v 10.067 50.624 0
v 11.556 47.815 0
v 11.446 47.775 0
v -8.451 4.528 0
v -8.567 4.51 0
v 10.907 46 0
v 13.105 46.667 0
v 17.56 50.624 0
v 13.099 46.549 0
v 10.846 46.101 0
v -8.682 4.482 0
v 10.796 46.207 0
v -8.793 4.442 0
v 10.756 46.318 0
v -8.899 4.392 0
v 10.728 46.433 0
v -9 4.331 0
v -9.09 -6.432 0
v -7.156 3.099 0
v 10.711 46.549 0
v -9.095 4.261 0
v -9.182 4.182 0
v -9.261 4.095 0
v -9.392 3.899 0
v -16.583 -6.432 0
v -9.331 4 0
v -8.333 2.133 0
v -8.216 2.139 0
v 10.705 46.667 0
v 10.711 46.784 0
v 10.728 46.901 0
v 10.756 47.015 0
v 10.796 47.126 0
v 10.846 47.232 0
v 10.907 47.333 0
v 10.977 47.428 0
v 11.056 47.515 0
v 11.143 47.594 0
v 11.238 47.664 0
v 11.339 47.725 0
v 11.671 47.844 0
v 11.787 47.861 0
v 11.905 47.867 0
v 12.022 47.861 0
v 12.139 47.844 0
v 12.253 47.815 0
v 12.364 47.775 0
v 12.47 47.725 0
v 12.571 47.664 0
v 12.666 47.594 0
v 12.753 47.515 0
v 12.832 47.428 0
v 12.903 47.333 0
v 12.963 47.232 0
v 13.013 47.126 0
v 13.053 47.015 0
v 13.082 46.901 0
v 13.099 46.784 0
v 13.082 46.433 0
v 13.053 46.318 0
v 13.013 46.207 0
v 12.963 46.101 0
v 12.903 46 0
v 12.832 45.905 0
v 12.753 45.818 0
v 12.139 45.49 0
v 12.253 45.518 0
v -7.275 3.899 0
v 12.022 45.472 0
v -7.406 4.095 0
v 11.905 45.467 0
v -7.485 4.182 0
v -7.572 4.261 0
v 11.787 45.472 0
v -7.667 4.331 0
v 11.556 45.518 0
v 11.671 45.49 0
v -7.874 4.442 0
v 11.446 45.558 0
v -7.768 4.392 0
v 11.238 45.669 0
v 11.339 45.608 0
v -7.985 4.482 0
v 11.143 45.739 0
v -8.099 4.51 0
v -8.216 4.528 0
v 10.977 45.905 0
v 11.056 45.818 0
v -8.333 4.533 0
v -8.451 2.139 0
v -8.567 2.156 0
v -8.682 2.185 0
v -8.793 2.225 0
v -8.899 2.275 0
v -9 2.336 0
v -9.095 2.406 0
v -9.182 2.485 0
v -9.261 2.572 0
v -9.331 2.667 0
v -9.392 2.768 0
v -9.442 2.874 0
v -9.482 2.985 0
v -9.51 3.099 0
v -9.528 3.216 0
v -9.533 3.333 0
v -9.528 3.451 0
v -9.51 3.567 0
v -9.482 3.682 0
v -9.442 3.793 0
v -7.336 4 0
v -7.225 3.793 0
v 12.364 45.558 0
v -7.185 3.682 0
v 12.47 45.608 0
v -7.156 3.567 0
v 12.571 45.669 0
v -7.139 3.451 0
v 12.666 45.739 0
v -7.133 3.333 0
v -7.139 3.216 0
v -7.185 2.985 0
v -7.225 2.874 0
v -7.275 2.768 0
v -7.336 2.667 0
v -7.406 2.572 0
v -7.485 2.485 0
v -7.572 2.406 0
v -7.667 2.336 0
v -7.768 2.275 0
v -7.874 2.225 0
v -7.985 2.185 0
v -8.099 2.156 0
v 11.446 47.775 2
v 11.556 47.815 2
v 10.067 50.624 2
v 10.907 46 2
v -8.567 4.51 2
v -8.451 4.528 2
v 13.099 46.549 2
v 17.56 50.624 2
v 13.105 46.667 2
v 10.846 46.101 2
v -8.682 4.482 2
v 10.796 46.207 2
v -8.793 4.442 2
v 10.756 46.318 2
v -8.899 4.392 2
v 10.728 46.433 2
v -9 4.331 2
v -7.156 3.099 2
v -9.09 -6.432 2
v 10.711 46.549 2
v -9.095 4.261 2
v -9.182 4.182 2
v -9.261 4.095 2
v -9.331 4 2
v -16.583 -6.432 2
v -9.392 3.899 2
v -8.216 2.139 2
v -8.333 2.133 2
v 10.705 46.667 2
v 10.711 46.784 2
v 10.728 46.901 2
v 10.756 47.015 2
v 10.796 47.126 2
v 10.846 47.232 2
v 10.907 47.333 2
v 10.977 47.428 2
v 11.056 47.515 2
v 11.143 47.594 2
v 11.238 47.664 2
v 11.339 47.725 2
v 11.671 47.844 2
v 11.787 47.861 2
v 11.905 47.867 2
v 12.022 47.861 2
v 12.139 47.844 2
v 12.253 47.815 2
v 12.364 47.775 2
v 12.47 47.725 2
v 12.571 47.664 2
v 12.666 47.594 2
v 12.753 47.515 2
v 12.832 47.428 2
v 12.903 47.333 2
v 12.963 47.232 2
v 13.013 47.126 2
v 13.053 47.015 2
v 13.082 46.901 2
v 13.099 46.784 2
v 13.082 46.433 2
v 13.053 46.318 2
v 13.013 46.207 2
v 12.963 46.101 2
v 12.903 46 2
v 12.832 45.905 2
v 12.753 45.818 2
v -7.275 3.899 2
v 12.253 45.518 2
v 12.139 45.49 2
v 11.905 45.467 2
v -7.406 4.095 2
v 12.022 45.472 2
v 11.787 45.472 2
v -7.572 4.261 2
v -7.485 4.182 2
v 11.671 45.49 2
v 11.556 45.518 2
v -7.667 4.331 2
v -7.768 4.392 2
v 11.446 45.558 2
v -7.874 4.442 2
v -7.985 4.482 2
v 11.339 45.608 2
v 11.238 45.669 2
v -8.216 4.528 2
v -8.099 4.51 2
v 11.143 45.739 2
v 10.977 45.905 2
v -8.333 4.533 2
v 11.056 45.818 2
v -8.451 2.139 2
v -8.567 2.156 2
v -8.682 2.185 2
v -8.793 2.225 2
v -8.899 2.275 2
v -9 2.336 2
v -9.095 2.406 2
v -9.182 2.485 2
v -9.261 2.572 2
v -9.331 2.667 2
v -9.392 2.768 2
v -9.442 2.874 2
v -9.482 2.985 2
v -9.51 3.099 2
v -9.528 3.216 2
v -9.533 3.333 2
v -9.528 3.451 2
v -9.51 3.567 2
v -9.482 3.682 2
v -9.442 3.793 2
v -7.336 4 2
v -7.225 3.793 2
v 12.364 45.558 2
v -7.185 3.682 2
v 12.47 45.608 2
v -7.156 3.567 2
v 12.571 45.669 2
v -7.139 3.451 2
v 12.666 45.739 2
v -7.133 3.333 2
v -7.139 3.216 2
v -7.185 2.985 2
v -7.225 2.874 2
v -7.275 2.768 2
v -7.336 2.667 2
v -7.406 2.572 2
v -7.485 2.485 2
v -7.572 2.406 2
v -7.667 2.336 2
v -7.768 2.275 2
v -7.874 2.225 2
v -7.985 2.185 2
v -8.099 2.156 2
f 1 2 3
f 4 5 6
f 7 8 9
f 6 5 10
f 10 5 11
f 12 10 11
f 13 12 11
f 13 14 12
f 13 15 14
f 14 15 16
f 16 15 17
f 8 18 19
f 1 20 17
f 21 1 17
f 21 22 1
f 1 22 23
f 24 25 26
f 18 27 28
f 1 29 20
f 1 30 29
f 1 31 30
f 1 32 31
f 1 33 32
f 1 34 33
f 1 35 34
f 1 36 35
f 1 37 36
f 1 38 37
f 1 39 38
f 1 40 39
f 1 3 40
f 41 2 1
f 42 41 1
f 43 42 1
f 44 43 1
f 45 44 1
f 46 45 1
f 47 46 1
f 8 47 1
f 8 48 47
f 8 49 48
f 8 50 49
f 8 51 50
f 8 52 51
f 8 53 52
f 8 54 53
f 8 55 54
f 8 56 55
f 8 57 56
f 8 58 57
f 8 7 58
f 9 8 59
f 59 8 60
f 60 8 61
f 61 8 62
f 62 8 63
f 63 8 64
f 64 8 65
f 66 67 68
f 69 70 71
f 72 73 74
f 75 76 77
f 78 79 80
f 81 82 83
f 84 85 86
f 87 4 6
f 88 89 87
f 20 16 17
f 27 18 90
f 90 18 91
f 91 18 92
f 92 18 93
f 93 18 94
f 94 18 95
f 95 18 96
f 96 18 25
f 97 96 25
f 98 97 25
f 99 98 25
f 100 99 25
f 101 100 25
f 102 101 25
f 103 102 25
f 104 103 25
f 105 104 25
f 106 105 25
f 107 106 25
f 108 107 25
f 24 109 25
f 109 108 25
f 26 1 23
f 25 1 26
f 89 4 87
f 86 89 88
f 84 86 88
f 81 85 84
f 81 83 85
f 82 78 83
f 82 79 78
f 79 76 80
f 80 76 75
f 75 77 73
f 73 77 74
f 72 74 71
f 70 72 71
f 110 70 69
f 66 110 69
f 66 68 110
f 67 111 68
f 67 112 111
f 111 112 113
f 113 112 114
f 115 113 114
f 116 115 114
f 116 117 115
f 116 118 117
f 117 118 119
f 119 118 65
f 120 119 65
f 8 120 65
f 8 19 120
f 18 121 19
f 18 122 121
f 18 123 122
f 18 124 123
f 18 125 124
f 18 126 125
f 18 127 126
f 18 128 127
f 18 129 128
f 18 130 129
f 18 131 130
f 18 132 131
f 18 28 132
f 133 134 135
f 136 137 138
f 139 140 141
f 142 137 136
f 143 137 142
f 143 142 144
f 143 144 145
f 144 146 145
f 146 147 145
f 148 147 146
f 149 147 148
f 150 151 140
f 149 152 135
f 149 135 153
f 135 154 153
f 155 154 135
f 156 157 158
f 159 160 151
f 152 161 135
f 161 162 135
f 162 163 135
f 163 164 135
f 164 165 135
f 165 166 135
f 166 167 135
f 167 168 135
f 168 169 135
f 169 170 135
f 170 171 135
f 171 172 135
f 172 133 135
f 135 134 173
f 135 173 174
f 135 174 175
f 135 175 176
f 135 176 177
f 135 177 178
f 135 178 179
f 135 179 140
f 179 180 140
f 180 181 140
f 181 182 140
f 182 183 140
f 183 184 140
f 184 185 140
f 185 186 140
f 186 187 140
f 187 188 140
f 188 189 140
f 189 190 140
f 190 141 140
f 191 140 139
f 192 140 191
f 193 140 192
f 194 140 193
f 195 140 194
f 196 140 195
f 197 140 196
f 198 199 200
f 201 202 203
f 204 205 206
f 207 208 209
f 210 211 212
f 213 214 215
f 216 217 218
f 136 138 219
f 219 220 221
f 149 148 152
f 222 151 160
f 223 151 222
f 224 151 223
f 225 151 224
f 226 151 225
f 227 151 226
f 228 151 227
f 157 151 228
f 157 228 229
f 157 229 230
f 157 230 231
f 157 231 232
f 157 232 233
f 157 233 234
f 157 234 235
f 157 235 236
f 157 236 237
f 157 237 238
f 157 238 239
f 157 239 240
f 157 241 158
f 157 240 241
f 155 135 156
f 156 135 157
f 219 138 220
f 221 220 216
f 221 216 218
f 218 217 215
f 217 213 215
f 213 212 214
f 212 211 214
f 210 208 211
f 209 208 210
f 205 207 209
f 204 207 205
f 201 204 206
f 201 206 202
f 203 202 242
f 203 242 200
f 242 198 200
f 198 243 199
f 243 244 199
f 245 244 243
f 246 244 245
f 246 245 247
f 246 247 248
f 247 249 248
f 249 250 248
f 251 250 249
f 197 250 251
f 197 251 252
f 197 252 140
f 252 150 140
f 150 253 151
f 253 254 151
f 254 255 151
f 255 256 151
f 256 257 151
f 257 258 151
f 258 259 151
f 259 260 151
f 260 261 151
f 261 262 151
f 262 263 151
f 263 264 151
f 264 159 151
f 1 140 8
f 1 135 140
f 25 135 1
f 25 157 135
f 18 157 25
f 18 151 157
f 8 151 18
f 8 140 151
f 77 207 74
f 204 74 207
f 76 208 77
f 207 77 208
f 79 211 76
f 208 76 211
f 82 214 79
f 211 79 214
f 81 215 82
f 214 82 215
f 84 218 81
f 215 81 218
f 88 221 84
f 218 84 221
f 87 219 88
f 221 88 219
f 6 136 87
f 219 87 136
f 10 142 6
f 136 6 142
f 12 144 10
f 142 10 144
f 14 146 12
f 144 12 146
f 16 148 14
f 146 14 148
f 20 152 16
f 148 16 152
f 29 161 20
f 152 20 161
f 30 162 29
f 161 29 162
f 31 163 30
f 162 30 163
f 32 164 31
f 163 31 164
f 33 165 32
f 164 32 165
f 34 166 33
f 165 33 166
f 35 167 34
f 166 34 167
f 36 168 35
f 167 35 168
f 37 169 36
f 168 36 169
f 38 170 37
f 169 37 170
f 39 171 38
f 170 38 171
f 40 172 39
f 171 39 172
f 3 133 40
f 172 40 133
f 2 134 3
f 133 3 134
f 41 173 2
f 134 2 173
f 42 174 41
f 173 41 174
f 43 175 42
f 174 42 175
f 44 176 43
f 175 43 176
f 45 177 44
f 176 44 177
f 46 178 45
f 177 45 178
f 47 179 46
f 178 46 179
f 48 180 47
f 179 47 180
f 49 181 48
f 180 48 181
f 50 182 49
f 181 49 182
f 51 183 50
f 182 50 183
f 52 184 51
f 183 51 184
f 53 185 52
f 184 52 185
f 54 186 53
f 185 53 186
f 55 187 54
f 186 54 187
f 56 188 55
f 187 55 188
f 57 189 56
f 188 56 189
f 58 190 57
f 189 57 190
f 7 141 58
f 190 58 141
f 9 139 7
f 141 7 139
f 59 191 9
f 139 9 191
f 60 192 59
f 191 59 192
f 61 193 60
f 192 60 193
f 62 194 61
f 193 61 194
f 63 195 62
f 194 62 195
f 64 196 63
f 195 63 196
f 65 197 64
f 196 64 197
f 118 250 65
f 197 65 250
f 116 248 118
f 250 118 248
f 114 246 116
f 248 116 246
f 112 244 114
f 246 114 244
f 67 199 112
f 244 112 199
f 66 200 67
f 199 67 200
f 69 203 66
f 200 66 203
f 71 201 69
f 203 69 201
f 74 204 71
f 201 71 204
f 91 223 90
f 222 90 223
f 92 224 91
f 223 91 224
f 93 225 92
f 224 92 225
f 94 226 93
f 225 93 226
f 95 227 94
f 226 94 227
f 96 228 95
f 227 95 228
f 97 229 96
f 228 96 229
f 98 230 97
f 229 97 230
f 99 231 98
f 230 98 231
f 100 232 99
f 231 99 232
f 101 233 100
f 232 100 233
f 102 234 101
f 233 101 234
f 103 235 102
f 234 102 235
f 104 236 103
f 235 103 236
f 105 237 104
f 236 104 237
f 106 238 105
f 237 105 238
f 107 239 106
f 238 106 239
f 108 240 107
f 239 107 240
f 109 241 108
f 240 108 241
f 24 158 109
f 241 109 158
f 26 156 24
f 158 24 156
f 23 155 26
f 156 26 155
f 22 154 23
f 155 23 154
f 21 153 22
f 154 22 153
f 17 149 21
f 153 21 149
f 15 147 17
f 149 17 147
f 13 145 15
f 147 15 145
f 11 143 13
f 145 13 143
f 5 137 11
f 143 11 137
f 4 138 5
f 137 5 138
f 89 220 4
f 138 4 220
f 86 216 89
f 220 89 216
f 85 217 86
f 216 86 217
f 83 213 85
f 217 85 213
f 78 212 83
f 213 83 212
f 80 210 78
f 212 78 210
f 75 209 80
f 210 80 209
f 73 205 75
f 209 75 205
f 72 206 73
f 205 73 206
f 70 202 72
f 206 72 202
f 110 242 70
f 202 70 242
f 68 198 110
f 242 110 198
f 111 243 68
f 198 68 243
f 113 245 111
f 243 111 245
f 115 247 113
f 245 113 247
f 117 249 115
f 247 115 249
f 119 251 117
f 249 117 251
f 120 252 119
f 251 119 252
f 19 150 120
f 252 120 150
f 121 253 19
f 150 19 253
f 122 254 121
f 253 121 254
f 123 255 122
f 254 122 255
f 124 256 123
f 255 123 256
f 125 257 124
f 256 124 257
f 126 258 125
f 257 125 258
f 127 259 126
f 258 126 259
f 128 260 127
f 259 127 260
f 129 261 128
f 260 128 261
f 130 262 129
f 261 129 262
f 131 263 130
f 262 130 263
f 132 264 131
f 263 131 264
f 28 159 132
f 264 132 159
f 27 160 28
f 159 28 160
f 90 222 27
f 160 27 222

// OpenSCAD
$fn = $preview ? 12 : 64;

// letterbox thickness is ~17.5mm
// screw recommends drill hole of 2mm diameter
// measured max screw diameter is 2.85mm

module main () {
  letter3d(
    char = "/",
    char_size = 50,
    height = 2,
    with_holes = true,
    hole_radius = 1.2
  );
}

module letter3d (char, char_size, height = 2, with_holes, hole_radius) {
  linear_extrude(height = height)
    letter2d(
      char = char,
      char_size = char_size,
      with_holes = with_holes,
      hole_radius = hole_radius
    );
}

module letter2d (char, char_size, with_holes = false, hole_radius) {
  difference() {
    letter2d_text(char = char, char_size = char_size);

    if (with_holes) {
      letter2d_holes(char = char, char_size = char_size, hole_radius = hole_radius);
    }
  }
}

module letter2d_text(char, char_size = 10) {
  text(
    text = char,
    size = char_size,
    // font = "DejaVu Sans Mono:style=Bold",
    // font = "Ubuntu Mono:style=Bold",
    font = "Bitstream Vera Sans Mono:style=Bold",
    // font = "Noto Sans Mono:style=Bold",
    halign = "center"
  );
}

module letter2d_holes(char, char_size = 10, hole_radius = 2) {
  offset_x_top =
    char == "1" ? char_size / 30
    : char == "4" ? char_size / 6.40
    : char == "/" ? char_size / 4.2
    : 0;

  offset_x_bottom =
    char == "7" ? -char_size / 10.5
    : char == "/" ? -char_size / 6
    : offset_x_top;
    

  offset_y = char_size / 15;

  union() {
    translate([offset_x_top, char_size - offset_y])
      circle(r = hole_radius);

    translate([offset_x_bottom, offset_y])
      circle(r = hole_radius);
  }
}

main();
